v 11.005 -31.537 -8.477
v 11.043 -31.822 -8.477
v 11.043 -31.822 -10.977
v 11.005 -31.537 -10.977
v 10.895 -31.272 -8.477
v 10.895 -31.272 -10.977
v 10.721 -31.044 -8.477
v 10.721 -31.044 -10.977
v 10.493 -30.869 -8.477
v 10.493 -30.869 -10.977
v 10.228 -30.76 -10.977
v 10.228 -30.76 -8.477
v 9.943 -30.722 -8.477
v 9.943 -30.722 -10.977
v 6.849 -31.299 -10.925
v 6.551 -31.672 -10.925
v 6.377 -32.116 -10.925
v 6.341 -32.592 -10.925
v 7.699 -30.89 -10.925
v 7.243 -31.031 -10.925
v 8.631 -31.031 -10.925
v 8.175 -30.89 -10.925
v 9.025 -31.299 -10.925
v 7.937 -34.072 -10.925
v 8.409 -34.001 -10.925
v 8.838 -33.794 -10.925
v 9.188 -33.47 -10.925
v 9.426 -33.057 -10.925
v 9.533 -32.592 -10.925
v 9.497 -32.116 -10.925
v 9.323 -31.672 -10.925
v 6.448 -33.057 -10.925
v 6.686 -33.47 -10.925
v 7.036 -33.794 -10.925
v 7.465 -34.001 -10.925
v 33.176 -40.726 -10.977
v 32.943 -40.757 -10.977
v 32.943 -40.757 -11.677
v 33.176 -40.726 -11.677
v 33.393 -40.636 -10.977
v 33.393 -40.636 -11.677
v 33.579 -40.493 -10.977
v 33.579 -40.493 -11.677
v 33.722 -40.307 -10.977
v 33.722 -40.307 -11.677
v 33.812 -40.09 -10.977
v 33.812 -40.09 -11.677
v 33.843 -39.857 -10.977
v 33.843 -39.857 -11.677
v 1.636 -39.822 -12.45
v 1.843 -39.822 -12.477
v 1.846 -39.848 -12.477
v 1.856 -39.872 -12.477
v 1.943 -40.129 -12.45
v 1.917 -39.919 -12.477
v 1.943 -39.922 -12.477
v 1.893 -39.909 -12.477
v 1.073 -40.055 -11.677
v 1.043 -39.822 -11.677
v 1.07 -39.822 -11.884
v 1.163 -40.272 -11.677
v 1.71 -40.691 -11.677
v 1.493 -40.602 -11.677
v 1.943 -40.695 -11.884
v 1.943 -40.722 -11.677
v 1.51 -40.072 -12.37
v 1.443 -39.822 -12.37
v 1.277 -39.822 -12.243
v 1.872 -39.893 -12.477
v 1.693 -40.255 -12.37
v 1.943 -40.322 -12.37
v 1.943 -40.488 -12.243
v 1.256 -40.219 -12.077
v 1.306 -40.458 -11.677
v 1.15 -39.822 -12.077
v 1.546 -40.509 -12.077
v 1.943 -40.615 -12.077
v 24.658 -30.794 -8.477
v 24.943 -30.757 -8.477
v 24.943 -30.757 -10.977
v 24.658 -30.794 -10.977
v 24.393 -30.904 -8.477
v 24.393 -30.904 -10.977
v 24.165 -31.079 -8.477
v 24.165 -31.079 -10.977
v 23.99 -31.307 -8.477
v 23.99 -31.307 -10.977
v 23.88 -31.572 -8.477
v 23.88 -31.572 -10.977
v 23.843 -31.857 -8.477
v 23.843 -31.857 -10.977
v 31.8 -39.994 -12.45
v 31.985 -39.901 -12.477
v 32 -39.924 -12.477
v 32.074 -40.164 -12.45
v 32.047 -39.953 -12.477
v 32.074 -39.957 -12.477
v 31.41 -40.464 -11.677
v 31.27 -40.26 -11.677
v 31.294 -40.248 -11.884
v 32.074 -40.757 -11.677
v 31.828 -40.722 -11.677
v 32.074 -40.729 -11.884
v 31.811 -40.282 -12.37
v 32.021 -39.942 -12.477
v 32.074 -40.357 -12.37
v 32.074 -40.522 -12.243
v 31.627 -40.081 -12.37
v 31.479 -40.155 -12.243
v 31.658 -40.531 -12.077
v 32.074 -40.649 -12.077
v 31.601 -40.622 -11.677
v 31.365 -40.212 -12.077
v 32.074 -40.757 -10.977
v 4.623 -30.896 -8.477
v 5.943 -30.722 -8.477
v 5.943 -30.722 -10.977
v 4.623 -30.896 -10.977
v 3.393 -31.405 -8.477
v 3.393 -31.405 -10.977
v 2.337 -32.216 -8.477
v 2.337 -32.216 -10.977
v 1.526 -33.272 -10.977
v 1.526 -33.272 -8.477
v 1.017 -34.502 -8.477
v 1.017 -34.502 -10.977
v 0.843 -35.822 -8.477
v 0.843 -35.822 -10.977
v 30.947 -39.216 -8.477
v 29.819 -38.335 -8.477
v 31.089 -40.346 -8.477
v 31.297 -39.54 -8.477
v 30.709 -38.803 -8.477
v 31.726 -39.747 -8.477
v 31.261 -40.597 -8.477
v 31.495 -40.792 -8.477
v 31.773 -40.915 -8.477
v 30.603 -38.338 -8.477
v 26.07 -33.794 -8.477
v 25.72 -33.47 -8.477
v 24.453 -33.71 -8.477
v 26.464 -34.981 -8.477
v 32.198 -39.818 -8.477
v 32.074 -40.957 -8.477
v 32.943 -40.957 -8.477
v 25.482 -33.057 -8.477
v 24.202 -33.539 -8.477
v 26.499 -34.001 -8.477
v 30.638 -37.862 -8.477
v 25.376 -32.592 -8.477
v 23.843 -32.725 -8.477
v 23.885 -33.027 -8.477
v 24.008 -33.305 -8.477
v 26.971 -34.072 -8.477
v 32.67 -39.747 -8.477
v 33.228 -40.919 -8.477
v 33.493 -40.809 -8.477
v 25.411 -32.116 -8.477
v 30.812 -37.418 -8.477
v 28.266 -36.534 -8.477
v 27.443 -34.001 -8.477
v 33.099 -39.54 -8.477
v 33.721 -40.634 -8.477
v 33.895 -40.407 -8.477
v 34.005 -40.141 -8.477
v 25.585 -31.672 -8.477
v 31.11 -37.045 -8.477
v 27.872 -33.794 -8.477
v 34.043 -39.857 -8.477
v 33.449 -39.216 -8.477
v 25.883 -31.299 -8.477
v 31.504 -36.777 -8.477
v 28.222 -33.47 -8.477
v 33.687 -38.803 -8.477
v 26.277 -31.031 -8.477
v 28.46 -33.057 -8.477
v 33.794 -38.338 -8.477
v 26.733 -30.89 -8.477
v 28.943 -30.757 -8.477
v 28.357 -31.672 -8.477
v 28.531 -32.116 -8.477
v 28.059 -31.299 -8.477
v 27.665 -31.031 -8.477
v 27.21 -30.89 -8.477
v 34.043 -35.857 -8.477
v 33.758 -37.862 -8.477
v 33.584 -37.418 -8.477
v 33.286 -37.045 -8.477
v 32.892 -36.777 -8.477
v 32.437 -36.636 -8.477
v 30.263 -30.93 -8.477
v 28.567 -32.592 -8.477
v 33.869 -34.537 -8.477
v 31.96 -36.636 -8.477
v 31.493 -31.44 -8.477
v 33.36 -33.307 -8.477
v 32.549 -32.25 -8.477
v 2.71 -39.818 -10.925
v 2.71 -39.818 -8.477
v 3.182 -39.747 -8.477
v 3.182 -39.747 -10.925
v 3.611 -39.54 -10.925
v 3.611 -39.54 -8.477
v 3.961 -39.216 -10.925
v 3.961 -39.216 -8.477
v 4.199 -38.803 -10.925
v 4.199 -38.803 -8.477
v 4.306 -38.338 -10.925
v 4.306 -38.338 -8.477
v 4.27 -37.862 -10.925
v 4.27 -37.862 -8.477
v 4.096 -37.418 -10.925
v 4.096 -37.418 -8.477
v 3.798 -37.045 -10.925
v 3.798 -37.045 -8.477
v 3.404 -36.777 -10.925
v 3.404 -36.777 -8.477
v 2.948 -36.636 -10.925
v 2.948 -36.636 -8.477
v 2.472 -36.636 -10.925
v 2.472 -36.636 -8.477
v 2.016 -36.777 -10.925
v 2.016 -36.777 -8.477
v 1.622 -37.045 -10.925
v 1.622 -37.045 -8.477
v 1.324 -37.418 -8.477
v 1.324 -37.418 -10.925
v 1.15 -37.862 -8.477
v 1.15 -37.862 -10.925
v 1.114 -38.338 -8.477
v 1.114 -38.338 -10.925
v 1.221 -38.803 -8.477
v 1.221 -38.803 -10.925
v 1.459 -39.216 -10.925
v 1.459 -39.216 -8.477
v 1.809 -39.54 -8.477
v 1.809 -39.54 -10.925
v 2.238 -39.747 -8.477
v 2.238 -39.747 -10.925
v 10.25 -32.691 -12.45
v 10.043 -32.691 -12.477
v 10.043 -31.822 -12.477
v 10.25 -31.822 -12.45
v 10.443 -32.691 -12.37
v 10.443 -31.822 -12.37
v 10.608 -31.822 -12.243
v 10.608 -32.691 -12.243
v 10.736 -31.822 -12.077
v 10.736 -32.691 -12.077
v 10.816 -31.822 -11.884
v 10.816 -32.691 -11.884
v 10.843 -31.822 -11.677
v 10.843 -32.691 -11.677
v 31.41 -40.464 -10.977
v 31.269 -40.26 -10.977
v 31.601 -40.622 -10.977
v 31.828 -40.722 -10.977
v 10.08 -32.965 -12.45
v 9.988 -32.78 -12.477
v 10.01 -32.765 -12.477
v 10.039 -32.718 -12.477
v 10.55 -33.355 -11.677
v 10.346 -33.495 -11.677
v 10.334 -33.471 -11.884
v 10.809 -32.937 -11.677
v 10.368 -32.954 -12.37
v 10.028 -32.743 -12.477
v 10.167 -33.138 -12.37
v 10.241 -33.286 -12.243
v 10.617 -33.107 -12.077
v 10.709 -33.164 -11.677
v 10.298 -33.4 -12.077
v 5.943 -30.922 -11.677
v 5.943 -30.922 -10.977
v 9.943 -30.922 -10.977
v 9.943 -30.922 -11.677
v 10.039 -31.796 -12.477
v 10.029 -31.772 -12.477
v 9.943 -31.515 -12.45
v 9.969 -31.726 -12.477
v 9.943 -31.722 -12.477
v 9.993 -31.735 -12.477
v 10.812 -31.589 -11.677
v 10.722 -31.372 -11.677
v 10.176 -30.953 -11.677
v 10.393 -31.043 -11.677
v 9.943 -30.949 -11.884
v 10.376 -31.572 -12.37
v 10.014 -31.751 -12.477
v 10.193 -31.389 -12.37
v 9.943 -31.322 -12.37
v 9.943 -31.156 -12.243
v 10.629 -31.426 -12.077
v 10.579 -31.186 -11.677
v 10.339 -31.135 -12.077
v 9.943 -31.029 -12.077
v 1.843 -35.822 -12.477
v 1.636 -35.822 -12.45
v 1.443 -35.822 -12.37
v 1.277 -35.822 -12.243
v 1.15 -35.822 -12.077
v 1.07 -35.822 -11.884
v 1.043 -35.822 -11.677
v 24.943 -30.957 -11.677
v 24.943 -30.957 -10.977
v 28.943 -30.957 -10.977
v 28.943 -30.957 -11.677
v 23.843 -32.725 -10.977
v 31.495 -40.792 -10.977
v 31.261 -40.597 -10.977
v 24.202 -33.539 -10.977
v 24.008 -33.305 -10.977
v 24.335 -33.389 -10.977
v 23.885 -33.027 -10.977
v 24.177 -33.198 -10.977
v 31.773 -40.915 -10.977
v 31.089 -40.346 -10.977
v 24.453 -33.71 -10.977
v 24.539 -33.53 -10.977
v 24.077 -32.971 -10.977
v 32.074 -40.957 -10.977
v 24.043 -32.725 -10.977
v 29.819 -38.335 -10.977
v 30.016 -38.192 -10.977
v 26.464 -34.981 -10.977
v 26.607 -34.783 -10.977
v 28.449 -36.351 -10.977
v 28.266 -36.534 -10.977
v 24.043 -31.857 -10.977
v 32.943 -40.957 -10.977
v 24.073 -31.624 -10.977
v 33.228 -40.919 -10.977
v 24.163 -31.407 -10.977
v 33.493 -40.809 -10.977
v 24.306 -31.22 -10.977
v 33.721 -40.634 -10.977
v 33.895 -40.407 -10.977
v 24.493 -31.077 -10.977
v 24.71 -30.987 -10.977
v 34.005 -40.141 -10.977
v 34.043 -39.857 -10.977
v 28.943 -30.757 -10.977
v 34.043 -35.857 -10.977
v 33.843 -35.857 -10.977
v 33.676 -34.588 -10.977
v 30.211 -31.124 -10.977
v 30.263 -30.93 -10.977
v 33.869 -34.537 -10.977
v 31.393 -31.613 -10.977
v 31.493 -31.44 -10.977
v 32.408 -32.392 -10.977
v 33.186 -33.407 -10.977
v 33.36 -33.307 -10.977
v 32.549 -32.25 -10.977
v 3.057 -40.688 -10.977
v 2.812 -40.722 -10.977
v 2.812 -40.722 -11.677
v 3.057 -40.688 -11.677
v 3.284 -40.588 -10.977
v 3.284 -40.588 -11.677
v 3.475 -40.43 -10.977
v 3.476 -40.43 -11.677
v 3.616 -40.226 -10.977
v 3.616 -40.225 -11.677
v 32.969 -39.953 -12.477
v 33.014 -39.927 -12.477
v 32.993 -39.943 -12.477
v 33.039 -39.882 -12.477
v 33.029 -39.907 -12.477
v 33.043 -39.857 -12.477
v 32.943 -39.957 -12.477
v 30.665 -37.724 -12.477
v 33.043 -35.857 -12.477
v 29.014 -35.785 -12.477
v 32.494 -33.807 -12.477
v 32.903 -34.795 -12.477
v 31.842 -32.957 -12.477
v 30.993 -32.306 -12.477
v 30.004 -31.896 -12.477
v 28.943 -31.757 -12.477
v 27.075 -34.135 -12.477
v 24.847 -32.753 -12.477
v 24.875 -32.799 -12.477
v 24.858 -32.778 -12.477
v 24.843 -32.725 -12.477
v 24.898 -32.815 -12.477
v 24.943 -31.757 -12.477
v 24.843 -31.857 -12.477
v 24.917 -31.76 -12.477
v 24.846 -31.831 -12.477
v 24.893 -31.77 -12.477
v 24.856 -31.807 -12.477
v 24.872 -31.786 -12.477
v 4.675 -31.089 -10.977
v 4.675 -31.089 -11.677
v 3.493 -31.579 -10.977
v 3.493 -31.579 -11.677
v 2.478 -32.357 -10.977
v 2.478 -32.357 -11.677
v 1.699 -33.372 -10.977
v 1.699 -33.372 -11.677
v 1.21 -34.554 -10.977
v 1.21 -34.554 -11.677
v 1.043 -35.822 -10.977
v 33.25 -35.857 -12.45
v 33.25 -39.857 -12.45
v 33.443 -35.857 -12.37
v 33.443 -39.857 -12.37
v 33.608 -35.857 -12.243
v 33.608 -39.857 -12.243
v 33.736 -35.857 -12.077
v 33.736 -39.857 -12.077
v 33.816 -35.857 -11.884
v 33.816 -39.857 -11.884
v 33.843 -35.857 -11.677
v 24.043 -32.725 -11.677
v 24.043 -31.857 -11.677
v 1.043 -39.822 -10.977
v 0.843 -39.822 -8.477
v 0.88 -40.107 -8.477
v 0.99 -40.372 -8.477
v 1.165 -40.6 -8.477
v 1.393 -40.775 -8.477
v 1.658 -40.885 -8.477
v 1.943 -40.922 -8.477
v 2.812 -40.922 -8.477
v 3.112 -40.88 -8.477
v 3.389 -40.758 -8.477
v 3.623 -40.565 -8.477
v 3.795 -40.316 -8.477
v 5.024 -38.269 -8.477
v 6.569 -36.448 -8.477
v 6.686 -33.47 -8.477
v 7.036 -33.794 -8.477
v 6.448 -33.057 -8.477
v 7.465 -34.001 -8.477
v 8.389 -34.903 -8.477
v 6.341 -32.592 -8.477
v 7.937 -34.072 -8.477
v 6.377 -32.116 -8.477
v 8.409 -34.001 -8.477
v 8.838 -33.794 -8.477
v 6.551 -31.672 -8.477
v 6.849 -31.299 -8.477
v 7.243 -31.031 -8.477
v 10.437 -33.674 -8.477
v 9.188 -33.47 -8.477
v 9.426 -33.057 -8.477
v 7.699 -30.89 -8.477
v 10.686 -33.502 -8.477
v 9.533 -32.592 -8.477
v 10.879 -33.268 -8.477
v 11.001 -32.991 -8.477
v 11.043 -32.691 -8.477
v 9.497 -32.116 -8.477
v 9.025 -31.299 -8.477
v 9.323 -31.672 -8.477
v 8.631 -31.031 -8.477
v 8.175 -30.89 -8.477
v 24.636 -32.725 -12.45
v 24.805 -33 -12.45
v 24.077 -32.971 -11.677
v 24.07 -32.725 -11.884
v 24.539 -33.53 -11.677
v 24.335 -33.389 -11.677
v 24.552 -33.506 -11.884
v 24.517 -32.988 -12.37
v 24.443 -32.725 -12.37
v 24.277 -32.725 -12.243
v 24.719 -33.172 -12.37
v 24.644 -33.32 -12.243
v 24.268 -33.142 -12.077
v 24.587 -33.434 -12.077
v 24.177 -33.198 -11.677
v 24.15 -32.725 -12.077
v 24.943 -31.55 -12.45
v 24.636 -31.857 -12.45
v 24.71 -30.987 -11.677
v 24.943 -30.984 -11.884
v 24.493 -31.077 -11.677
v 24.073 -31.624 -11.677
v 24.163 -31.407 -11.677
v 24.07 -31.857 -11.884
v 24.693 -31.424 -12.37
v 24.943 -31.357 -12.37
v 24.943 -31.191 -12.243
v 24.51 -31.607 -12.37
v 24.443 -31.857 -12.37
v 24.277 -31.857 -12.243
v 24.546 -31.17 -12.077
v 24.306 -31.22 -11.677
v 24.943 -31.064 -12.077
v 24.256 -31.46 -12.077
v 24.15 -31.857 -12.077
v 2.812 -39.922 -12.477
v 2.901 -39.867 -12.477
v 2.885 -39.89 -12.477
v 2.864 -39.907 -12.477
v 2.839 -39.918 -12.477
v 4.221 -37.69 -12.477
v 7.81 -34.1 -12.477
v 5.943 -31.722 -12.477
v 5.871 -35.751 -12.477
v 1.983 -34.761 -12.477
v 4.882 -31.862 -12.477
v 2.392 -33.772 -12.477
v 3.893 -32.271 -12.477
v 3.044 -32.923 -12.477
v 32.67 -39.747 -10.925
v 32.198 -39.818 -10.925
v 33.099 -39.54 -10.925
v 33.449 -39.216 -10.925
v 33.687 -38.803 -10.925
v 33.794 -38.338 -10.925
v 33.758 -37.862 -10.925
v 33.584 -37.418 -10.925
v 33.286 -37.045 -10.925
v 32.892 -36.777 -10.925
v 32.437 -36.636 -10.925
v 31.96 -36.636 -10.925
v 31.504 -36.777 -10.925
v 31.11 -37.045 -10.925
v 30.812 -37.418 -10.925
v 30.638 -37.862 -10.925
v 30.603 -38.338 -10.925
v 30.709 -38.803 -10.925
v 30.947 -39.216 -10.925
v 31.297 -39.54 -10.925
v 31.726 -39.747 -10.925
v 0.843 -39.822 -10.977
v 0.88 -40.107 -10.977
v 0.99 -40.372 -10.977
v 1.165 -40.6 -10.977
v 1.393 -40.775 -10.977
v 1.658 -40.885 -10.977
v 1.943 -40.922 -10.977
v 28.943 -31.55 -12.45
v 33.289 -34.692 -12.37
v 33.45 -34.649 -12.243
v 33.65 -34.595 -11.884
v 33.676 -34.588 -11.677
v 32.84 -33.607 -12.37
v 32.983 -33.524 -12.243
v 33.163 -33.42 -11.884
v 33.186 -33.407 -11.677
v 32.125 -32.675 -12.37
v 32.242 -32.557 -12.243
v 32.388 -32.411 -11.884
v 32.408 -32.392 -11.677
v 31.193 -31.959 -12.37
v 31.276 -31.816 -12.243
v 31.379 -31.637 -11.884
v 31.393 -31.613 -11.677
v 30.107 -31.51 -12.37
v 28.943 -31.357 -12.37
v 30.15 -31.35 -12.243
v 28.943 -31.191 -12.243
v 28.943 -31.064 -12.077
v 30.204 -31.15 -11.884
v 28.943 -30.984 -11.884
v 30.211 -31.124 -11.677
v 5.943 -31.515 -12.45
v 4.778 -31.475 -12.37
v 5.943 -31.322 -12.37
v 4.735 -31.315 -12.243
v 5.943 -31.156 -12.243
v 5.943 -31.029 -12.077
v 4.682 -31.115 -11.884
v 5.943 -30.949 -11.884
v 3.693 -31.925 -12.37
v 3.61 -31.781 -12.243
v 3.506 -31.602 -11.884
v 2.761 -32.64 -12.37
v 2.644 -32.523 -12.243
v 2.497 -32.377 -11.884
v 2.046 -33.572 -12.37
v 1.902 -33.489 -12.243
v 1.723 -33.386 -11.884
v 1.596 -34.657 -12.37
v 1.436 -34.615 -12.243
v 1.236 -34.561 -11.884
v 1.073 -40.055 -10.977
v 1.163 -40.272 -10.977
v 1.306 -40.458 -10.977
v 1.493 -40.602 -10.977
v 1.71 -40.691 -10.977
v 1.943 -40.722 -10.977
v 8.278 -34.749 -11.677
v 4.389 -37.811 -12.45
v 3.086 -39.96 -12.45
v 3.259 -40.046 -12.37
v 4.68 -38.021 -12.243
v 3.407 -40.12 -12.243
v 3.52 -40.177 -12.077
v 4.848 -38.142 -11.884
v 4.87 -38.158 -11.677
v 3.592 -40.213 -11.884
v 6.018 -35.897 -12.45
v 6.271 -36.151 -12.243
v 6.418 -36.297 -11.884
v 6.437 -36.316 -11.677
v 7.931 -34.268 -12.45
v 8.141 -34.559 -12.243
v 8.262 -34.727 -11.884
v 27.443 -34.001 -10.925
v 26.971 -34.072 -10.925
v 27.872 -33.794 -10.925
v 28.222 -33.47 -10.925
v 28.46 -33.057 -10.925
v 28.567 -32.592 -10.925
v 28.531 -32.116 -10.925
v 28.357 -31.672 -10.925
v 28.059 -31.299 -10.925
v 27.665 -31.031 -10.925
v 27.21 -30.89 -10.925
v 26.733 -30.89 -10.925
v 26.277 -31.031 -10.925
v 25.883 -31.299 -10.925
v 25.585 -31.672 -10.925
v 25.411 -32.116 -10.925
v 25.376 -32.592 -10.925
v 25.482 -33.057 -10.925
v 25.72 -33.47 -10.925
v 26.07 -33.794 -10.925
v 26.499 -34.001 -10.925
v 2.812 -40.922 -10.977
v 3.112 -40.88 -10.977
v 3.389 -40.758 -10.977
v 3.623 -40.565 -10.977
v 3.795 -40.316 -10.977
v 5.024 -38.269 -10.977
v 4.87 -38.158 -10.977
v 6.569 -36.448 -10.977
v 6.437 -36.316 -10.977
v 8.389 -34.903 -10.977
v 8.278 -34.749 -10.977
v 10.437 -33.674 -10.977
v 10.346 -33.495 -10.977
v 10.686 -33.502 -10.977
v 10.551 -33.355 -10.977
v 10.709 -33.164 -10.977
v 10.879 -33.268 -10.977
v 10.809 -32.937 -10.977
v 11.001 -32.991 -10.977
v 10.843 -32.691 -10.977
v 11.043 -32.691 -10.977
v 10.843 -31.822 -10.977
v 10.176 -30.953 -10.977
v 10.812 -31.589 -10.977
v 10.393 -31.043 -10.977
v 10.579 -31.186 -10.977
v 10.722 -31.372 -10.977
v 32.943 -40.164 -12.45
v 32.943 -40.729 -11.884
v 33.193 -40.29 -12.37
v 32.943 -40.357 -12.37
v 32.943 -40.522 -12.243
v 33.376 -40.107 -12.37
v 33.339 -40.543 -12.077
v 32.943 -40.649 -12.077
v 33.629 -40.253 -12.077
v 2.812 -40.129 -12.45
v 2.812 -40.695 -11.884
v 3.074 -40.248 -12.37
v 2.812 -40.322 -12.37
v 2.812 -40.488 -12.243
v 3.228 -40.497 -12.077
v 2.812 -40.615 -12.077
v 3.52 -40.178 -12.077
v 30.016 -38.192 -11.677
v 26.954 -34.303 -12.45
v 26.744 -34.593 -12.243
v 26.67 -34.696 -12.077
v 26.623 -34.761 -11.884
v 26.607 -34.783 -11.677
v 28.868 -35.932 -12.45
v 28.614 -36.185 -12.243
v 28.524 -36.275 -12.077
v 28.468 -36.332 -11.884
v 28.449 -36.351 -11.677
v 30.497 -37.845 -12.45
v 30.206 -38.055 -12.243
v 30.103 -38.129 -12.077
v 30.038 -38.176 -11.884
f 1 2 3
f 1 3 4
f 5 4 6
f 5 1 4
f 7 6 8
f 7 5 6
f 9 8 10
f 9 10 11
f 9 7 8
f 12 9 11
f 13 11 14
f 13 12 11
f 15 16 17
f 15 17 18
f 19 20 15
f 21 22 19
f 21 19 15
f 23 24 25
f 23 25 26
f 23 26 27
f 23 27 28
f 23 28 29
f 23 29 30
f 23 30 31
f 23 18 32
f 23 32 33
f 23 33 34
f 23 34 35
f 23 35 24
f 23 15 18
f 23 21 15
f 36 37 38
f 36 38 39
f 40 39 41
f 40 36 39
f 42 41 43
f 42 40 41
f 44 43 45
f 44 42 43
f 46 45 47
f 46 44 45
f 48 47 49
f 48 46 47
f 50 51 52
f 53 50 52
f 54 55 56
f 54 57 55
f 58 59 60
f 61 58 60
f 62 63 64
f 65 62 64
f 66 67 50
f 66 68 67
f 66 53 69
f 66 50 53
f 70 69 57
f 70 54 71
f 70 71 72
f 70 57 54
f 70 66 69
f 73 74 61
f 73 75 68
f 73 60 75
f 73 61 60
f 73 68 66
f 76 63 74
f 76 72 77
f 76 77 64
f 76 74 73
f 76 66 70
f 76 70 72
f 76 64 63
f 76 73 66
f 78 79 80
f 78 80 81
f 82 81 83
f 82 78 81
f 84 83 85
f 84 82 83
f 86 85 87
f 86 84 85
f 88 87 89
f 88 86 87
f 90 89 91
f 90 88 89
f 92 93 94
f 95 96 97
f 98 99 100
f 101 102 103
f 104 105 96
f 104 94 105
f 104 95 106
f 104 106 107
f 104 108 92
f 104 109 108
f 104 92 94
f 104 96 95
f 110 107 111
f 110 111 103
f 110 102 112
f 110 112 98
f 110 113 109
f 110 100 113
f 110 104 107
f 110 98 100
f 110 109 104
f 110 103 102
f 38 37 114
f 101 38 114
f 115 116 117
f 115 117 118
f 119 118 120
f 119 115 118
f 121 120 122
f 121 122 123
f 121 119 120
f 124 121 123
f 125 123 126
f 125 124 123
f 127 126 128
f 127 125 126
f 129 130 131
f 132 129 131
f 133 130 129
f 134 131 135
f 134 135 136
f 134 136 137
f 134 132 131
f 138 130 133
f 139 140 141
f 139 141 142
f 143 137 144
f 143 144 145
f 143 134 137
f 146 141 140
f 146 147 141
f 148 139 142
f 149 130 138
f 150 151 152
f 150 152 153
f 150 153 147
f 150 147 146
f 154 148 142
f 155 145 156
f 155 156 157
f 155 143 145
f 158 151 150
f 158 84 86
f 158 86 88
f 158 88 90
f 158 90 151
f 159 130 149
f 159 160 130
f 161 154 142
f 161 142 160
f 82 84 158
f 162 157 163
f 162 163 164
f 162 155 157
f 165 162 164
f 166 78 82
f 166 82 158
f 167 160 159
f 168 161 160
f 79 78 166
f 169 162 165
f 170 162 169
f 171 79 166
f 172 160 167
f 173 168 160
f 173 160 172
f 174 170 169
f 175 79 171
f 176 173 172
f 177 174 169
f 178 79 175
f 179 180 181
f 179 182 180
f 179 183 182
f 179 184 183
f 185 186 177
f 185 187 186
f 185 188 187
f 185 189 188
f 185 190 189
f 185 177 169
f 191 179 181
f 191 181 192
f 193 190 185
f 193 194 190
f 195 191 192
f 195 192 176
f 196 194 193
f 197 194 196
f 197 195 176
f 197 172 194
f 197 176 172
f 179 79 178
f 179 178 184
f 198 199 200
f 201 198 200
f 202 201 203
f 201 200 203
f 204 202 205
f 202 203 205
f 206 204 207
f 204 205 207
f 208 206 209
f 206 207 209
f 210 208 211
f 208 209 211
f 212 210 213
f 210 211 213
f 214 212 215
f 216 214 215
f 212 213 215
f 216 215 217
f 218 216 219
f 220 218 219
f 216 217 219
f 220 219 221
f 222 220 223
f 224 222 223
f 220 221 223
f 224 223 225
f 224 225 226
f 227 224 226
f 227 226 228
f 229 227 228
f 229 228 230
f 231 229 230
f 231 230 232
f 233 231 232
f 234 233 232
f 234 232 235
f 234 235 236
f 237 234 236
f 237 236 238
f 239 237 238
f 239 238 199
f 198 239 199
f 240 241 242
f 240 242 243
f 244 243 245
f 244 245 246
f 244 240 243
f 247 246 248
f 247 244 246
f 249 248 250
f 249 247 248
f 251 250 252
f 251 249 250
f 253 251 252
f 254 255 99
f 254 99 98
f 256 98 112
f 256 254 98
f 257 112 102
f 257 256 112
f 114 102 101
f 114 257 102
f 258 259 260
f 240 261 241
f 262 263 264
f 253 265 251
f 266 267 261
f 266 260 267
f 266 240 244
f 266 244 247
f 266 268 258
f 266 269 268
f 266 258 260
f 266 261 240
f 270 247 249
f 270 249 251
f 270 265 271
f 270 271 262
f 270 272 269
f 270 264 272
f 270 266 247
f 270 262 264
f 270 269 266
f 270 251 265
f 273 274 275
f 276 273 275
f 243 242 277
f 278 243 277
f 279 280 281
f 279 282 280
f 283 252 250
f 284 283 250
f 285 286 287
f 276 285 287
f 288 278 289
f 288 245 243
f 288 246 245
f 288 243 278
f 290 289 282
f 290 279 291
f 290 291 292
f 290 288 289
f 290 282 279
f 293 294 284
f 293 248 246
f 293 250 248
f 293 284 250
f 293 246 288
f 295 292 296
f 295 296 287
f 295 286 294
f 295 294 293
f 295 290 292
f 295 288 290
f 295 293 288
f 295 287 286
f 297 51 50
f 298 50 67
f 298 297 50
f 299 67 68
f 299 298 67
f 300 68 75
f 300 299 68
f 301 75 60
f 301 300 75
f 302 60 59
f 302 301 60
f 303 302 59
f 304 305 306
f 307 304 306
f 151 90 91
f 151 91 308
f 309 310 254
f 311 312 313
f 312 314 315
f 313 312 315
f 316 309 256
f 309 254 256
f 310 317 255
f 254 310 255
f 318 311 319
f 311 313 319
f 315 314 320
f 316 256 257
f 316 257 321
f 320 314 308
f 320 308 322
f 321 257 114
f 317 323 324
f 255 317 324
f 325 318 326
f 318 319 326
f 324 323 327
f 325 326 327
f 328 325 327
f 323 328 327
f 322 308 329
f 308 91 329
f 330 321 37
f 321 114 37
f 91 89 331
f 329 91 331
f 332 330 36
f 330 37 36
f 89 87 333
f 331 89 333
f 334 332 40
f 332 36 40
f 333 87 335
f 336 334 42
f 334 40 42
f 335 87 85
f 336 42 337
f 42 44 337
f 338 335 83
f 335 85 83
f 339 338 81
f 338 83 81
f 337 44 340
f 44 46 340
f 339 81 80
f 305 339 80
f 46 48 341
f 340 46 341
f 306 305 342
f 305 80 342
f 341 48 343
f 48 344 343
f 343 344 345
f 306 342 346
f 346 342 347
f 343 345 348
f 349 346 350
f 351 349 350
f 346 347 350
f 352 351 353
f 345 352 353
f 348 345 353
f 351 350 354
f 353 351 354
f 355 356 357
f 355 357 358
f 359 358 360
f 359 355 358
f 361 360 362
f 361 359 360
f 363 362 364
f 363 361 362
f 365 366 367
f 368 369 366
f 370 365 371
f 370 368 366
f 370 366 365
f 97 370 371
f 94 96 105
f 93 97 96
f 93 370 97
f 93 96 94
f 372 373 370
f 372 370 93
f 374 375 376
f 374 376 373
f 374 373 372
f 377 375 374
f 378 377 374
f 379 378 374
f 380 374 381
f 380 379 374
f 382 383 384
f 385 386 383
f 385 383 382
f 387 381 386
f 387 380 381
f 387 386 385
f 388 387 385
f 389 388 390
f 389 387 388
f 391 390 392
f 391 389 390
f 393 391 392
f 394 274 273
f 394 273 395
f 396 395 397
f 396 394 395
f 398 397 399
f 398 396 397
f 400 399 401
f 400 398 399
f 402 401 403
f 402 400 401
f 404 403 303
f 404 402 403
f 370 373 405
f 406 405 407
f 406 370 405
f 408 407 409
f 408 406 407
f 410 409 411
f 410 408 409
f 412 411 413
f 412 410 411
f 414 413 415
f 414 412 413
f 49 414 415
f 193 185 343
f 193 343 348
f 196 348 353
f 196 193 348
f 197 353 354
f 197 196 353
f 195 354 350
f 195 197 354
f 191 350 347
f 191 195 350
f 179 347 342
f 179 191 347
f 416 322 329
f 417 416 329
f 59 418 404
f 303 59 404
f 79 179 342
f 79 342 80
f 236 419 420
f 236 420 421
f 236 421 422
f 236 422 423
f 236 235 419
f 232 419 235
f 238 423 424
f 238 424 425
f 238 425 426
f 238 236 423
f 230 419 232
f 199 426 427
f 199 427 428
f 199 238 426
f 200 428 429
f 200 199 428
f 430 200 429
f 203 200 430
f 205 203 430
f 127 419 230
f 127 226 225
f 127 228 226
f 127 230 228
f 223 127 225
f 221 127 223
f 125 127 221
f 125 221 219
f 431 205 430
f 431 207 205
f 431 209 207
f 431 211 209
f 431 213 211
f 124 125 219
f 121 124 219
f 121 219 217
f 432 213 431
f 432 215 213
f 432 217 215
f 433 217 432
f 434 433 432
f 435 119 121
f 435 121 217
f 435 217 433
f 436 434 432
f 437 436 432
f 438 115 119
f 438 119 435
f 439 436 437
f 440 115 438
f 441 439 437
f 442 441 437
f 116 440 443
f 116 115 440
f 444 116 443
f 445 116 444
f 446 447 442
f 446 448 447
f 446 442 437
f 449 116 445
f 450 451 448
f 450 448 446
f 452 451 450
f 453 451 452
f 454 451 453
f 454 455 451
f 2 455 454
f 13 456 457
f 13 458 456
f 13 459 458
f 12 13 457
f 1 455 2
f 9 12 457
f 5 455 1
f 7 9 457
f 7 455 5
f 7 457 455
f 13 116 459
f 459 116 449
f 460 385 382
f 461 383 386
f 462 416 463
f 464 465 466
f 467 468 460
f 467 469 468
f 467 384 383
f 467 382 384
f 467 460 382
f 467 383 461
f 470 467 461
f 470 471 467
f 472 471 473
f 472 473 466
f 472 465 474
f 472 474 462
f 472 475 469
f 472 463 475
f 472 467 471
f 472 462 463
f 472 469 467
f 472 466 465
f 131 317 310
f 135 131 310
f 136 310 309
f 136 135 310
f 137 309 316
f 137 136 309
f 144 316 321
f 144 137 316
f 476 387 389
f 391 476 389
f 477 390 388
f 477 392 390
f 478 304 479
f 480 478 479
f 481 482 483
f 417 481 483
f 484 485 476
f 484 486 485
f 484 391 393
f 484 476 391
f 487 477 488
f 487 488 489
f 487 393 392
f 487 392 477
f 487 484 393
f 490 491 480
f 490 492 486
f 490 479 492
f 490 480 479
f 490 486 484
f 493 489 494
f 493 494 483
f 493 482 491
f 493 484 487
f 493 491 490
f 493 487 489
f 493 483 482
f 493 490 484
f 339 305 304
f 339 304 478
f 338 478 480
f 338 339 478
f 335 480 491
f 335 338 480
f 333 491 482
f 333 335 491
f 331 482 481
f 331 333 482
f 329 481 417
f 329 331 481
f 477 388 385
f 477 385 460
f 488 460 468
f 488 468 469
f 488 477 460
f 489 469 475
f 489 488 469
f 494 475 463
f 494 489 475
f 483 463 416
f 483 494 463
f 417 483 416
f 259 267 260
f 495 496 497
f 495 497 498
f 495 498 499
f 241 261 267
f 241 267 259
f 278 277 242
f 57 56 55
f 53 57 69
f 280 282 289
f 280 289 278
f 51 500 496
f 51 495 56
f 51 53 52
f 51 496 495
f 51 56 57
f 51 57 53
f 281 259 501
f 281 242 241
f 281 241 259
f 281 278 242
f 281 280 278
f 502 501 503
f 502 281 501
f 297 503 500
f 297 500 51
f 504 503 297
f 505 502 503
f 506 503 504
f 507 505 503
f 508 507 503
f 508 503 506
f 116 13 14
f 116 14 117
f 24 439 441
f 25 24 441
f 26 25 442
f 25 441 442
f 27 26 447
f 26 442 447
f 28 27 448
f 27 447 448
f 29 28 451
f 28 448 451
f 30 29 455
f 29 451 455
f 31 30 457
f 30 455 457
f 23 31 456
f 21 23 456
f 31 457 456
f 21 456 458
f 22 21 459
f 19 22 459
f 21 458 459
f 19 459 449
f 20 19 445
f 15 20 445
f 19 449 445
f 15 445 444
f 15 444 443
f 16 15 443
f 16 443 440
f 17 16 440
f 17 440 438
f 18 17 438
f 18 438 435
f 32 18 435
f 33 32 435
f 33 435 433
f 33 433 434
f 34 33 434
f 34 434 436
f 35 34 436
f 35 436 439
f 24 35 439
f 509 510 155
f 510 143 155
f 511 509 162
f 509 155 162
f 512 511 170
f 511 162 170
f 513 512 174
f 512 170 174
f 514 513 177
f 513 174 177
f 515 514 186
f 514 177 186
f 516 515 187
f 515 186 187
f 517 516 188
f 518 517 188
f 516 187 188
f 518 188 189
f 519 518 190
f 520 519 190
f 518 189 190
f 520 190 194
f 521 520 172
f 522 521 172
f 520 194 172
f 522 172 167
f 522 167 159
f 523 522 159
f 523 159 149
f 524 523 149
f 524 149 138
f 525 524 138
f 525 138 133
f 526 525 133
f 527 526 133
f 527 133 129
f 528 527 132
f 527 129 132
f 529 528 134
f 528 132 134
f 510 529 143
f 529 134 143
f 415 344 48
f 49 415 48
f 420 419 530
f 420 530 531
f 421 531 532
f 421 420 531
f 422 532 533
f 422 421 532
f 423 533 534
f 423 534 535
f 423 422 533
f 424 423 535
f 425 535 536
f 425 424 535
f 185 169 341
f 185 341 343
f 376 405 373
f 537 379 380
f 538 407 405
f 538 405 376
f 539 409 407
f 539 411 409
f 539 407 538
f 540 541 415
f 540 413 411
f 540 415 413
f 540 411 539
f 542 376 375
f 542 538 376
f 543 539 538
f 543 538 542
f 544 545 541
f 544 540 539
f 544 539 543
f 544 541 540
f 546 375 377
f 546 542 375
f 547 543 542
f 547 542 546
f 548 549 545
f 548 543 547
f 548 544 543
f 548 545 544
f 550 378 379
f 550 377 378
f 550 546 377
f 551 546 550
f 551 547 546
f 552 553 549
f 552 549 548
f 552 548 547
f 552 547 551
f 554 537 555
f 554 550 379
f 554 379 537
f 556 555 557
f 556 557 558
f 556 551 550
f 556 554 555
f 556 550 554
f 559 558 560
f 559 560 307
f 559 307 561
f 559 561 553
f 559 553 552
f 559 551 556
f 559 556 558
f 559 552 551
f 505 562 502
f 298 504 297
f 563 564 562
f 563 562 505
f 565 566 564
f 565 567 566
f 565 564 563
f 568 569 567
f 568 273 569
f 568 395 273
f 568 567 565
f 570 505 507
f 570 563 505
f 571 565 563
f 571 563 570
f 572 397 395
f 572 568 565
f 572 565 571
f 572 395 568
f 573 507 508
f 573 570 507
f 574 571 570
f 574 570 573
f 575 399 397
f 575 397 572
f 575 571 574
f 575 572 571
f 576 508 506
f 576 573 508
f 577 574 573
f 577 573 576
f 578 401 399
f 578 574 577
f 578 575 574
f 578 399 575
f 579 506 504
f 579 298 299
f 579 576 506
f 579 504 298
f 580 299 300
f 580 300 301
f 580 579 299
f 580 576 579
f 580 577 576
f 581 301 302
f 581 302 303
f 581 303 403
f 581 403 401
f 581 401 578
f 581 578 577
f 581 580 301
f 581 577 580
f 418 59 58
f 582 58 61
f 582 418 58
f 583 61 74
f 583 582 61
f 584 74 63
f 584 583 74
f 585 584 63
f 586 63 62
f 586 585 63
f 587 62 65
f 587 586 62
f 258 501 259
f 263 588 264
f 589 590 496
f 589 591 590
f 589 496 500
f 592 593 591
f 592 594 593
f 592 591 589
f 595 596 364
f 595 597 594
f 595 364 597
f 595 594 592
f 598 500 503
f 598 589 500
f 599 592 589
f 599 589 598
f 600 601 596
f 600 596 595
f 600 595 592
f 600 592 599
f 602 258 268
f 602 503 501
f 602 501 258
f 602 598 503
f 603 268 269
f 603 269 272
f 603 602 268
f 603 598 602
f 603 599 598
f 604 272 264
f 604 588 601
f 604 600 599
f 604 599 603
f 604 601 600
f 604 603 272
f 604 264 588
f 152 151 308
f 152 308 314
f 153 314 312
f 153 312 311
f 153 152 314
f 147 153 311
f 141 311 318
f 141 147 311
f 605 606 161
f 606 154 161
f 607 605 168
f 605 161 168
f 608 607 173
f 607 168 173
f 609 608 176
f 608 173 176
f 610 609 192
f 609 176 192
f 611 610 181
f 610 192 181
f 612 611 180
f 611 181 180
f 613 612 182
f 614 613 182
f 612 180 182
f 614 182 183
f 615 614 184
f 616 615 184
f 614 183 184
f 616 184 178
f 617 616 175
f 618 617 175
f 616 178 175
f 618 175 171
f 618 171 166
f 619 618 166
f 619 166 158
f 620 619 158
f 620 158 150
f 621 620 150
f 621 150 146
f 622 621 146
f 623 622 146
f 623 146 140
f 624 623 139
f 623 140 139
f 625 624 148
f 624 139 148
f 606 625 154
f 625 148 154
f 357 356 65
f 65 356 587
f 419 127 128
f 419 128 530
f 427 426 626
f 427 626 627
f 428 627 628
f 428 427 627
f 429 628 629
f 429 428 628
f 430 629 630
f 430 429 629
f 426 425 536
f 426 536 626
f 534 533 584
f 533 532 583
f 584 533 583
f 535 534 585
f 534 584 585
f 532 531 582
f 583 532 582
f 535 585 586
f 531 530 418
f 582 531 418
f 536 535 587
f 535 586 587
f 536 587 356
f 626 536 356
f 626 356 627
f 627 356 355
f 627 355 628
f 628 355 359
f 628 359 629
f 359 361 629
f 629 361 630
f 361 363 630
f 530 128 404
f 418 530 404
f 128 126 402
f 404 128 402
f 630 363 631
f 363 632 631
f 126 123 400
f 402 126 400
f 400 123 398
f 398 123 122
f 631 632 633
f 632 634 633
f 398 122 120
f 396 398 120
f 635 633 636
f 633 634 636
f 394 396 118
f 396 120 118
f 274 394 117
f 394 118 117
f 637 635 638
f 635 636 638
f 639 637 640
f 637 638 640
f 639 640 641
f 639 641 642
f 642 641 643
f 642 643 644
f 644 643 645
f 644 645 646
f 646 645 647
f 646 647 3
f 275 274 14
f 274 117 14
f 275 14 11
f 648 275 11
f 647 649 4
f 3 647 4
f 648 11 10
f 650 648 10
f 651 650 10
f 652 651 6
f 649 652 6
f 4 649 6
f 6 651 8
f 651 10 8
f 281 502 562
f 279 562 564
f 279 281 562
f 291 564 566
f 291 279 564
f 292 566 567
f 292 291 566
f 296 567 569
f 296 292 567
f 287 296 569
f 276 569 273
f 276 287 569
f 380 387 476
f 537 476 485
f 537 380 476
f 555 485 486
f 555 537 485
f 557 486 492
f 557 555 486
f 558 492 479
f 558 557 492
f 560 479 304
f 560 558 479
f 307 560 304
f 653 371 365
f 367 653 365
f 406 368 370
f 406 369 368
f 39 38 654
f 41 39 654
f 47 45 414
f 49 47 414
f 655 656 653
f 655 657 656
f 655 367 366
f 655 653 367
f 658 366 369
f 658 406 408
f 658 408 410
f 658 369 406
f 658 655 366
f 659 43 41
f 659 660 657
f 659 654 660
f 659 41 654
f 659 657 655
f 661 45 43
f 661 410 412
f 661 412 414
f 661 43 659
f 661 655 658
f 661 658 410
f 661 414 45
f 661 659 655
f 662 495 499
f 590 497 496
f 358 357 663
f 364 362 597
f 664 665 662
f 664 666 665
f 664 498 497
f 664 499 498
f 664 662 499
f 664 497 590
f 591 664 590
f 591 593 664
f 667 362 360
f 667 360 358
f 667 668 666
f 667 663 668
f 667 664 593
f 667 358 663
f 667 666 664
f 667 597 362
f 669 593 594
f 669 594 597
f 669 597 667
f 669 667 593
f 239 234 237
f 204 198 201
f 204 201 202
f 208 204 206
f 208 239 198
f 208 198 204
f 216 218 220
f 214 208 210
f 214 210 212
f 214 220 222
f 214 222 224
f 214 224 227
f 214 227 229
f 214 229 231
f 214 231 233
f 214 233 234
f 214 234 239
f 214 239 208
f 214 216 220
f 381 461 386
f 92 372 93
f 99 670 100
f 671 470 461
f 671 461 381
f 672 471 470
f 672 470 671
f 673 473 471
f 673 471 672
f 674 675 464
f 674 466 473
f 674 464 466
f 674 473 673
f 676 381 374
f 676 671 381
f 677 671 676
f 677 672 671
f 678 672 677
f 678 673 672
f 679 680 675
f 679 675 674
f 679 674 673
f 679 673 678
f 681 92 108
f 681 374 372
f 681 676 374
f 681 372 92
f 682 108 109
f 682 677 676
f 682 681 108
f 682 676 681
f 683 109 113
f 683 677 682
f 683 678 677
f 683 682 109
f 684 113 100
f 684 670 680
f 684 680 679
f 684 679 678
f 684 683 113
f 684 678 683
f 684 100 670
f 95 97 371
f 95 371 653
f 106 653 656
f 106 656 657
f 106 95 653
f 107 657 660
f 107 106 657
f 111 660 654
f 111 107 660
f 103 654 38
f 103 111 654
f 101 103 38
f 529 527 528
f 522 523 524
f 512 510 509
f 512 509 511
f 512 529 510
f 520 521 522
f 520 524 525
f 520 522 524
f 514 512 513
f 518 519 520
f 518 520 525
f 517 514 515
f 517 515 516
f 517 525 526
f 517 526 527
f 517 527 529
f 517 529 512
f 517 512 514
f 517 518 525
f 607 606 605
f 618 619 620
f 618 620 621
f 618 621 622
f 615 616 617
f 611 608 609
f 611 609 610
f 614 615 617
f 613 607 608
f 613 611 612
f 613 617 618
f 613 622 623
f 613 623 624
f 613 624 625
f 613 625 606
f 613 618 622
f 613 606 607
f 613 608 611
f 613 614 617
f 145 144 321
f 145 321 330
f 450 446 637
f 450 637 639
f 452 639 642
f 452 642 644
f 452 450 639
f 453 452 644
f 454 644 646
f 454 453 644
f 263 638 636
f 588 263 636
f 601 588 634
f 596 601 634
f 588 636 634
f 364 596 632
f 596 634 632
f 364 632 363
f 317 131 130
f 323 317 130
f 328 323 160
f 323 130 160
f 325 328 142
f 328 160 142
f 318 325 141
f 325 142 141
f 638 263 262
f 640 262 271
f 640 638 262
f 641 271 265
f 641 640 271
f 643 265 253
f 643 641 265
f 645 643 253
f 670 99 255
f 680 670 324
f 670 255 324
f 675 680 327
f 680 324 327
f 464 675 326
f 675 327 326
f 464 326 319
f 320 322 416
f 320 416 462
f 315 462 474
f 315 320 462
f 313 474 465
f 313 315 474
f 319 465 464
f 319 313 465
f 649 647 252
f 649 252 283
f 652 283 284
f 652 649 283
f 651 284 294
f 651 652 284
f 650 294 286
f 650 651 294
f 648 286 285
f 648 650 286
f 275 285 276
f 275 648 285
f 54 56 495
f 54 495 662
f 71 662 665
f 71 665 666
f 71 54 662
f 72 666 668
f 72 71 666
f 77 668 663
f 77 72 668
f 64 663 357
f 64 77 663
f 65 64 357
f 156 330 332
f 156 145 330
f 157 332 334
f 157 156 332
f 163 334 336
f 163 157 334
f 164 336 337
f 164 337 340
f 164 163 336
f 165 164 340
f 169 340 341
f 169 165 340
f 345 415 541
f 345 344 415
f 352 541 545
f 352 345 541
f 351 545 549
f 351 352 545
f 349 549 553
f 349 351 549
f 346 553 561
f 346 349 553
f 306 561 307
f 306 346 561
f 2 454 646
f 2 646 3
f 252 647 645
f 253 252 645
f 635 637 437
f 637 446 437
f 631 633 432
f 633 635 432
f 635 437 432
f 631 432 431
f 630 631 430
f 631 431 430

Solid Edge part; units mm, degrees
sketch "Sketch1" plane through (0, 0, -8.4769) normal (0, 0, 1) x (1, 0, 0)
  line L0 (24.0428, -32.7254) -> (24.0428, -31.8566)
  arc A0 (24.0428, -31.8566) -> (24.9428, -30.9566) centre (24.9428, -31.8566) cw
  line L1 (24.9428, -30.9566) -> (28.9428, -30.9566)
  arc A1 (28.9428, -30.9566) -> (33.8428, -35.8566) centre (28.9428, -35.8566) cw
  line L2 (33.8428, -35.8566) -> (33.8428, -39.8566)
  arc A2 (33.8428, -39.8566) -> (32.9428, -40.7566) centre (32.9428, -39.8566) cw
  line L3 (32.9428, -40.7566) -> (32.074, -40.7566)
  arc A3 (32.074, -40.7566) -> (31.2695, -40.26) centre (32.074, -39.8566) cw
  arc A4 (31.2695, -40.26) -> (24.5394, -33.53) centre (17.7713, -47.0282) ccw
  arc A5 (24.5394, -33.53) -> (24.0428, -32.7254) centre (24.9428, -32.7254) cw
  line L4 (1.0428, -39.8221) -> (1.0428, -35.8221)
  arc A6 (1.0428, -35.8221) -> (5.9428, -30.9221) centre (5.9428, -35.8221) cw
  line L5 (5.9428, -30.9221) -> (9.9428, -30.9221)
  arc A7 (9.9428, -30.9221) -> (10.8428, -31.8221) centre (9.9428, -31.8221) cw
  line L6 (10.8428, -31.8221) -> (10.8428, -32.6909)
  arc A8 (10.8428, -32.6909) -> (10.3462, -33.4955) centre (9.9428, -32.6909) cw
  arc A9 (10.3462, -33.4955) -> (3.6162, -40.2255) centre (17.1144, -46.9937) ccw
  arc A10 (3.6162, -40.2255) -> (2.8117, -40.7221) centre (2.8117, -39.8221) cw
  line L7 (2.8117, -40.7221) -> (1.9428, -40.7221)
  arc A11 (1.9428, -40.7221) -> (1.0428, -39.8221) centre (1.9428, -39.8221) cw
extrude "ExtrudedProtrusion_1" add sketch "Sketch1" against normal blind 4
sketch "Sketch2" plane through (28.9428, -37.9566, -8.4769) normal (0, 0, 1) x (-1, 0, 0)
  line L0 (5.1, -6.1) -> (5.1, -5.2312)
  arc A0 (5.1, -5.2312) -> (4.4899, -4.2463) centre (4, -5.2312) ccw
  arc A1 (4.4899, -4.2463) -> (-2.1463, 2.3899) centre (12.0512, 9.9512) cw
  arc A2 (-2.1463, 2.3899) -> (-3.1312, 3) centre (-3.1312, 1.9) ccw
  line L1 (-3.1312, 3) -> (-4, 3)
  arc A3 (-4, 3) -> (-5.1, 1.9) centre (-4, 1.9) ccw
  line L2 (-5.1, 1.9) -> (-5.1, -2.1)
  arc A4 (-5.1, -2.1) -> (0, -7.2) centre (0, -2.1) ccw
  line L3 (0, -7.2) -> (4, -7.2)
  arc A5 (4, -7.2) -> (5.1, -6.1) centre (4, -6.1) ccw
  line L4 (4.9, -5.2312) -> (4.9, -6.1)
  arc A6 (4.9, -6.1) -> (4, -7) centre (4, -6.1) cw
  line L5 (4, -7) -> (0, -7)
  arc A7 (0, -7) -> (-4.9, -2.1) centre (0, -2.1) cw
  line L6 (-4.9, -2.1) -> (-4.9, 1.9)
  arc A8 (-4.9, 1.9) -> (-4, 2.8) centre (-4, 1.9) cw
  line L7 (-4, 2.8) -> (-3.1312, 2.8)
  arc A9 (-3.1312, 2.8) -> (-2.3267, 2.3034) centre (-3.1312, 1.9) cw
  arc A10 (-2.3267, 2.3034) -> (4.4034, -4.4267) centre (11.1716, 9.0716) ccw
  arc A11 (4.4034, -4.4267) -> (4.9, -5.2312) centre (4, -5.2312) cw
  arc A12 (25.3267, 2.2689) -> (26.1312, 2.7655) centre (26.1312, 1.8655) cw
  line L8 (26.1312, 2.7655) -> (27, 2.7655)
  arc A13 (27, 2.7655) -> (27.9, 1.8655) centre (27, 1.8655) cw
  line L9 (27.9, 1.8655) -> (27.9, -2.1345)
  arc A14 (27.9, -2.1345) -> (23, -7.0345) centre (23, -2.1345) cw
  line L10 (23, -7.0345) -> (19, -7.0345)
  arc A15 (19, -7.0345) -> (18.1, -6.1345) centre (19, -6.1345) cw
  line L11 (18.1, -6.1345) -> (18.1, -5.2657)
  arc A16 (18.1, -5.2657) -> (18.5966, -4.4612) centre (19, -5.2657) cw
  arc A17 (18.5966, -4.4612) -> (25.3267, 2.2689) centre (11.8284, 9.0371) ccw
  arc A18 (28.1, 1.8655) -> (27, 2.9655) centre (27, 1.8655) ccw
  line L12 (27, 2.9655) -> (26.1312, 2.9655)
  arc A19 (26.1312, 2.9655) -> (25.1482, 2.3593) centre (26.1312, 1.8655) ccw
  arc A20 (25.1482, 2.3593) -> (18.5062, -4.2827) centre (12.0161, 8.8494) cw
  arc A21 (18.5062, -4.2827) -> (17.9, -5.2657) centre (19, -5.2657) ccw
  line L13 (17.9, -5.2657) -> (17.9, -6.1345)
  arc A22 (17.9, -6.1345) -> (19, -7.2345) centre (19, -6.1345) ccw
  line L14 (19, -7.2345) -> (23, -7.2345)
  arc A23 (23, -7.2345) -> (28.1, -2.1345) centre (23, -2.1345) ccw
  line L15 (28.1, -2.1345) -> (28.1, 1.8655)
extrude "Protrusion1" add sketch "Sketch2" against normal blind 2.5
fillet "Round_1" radius 0.8 20 edges at (6.4371, -36.3164, -12.4769) (3.2844, -40.588, -12.4769) (2.3773, -40.7221, -12.4769) (1.3064, -40.4585, -12.4769) (1.0428, -37.8221, -12.4769) (2.478, -32.3573, -12.4769) (7.9428, -30.9221, -12.4769) (10.5792, -31.1857, -12.4769) (10.8428, -32.2565, -12.4769) (10.7087, -33.1637, -12.4769) (28.4486, -36.3509, -12.4769) (24.177, -33.1982, -12.4769) (24.0428, -32.291, -12.4769) (24.3064, -31.2202, -12.4769) (26.9428, -30.9566, -12.4769) (32.4077, -32.3918, -12.4769) (33.8428, -37.8566, -12.4769) (33.5792, -40.493, -12.4769) (32.5084, -40.7566, -12.4769) (31.6013, -40.6225, -12.4769)
sketch "Sketch3" plane through (28.9428, -35.8566, -8.4769) normal (0, 0, 1) x (0, -1, 0)
  circle A0 centre (2.3615, 3.2553) radius 1.6
  circle A1 centre (-3.3845, -1.9717) radius 1.6
  circle A2 centre (-3.3845, -21.0058) radius 1.6
  circle A3 centre (2.3615, -26.2328) radius 1.6
extrude "ExtrudedCutout_1" cut sketch "Sketch3" against normal blind 2.4485
